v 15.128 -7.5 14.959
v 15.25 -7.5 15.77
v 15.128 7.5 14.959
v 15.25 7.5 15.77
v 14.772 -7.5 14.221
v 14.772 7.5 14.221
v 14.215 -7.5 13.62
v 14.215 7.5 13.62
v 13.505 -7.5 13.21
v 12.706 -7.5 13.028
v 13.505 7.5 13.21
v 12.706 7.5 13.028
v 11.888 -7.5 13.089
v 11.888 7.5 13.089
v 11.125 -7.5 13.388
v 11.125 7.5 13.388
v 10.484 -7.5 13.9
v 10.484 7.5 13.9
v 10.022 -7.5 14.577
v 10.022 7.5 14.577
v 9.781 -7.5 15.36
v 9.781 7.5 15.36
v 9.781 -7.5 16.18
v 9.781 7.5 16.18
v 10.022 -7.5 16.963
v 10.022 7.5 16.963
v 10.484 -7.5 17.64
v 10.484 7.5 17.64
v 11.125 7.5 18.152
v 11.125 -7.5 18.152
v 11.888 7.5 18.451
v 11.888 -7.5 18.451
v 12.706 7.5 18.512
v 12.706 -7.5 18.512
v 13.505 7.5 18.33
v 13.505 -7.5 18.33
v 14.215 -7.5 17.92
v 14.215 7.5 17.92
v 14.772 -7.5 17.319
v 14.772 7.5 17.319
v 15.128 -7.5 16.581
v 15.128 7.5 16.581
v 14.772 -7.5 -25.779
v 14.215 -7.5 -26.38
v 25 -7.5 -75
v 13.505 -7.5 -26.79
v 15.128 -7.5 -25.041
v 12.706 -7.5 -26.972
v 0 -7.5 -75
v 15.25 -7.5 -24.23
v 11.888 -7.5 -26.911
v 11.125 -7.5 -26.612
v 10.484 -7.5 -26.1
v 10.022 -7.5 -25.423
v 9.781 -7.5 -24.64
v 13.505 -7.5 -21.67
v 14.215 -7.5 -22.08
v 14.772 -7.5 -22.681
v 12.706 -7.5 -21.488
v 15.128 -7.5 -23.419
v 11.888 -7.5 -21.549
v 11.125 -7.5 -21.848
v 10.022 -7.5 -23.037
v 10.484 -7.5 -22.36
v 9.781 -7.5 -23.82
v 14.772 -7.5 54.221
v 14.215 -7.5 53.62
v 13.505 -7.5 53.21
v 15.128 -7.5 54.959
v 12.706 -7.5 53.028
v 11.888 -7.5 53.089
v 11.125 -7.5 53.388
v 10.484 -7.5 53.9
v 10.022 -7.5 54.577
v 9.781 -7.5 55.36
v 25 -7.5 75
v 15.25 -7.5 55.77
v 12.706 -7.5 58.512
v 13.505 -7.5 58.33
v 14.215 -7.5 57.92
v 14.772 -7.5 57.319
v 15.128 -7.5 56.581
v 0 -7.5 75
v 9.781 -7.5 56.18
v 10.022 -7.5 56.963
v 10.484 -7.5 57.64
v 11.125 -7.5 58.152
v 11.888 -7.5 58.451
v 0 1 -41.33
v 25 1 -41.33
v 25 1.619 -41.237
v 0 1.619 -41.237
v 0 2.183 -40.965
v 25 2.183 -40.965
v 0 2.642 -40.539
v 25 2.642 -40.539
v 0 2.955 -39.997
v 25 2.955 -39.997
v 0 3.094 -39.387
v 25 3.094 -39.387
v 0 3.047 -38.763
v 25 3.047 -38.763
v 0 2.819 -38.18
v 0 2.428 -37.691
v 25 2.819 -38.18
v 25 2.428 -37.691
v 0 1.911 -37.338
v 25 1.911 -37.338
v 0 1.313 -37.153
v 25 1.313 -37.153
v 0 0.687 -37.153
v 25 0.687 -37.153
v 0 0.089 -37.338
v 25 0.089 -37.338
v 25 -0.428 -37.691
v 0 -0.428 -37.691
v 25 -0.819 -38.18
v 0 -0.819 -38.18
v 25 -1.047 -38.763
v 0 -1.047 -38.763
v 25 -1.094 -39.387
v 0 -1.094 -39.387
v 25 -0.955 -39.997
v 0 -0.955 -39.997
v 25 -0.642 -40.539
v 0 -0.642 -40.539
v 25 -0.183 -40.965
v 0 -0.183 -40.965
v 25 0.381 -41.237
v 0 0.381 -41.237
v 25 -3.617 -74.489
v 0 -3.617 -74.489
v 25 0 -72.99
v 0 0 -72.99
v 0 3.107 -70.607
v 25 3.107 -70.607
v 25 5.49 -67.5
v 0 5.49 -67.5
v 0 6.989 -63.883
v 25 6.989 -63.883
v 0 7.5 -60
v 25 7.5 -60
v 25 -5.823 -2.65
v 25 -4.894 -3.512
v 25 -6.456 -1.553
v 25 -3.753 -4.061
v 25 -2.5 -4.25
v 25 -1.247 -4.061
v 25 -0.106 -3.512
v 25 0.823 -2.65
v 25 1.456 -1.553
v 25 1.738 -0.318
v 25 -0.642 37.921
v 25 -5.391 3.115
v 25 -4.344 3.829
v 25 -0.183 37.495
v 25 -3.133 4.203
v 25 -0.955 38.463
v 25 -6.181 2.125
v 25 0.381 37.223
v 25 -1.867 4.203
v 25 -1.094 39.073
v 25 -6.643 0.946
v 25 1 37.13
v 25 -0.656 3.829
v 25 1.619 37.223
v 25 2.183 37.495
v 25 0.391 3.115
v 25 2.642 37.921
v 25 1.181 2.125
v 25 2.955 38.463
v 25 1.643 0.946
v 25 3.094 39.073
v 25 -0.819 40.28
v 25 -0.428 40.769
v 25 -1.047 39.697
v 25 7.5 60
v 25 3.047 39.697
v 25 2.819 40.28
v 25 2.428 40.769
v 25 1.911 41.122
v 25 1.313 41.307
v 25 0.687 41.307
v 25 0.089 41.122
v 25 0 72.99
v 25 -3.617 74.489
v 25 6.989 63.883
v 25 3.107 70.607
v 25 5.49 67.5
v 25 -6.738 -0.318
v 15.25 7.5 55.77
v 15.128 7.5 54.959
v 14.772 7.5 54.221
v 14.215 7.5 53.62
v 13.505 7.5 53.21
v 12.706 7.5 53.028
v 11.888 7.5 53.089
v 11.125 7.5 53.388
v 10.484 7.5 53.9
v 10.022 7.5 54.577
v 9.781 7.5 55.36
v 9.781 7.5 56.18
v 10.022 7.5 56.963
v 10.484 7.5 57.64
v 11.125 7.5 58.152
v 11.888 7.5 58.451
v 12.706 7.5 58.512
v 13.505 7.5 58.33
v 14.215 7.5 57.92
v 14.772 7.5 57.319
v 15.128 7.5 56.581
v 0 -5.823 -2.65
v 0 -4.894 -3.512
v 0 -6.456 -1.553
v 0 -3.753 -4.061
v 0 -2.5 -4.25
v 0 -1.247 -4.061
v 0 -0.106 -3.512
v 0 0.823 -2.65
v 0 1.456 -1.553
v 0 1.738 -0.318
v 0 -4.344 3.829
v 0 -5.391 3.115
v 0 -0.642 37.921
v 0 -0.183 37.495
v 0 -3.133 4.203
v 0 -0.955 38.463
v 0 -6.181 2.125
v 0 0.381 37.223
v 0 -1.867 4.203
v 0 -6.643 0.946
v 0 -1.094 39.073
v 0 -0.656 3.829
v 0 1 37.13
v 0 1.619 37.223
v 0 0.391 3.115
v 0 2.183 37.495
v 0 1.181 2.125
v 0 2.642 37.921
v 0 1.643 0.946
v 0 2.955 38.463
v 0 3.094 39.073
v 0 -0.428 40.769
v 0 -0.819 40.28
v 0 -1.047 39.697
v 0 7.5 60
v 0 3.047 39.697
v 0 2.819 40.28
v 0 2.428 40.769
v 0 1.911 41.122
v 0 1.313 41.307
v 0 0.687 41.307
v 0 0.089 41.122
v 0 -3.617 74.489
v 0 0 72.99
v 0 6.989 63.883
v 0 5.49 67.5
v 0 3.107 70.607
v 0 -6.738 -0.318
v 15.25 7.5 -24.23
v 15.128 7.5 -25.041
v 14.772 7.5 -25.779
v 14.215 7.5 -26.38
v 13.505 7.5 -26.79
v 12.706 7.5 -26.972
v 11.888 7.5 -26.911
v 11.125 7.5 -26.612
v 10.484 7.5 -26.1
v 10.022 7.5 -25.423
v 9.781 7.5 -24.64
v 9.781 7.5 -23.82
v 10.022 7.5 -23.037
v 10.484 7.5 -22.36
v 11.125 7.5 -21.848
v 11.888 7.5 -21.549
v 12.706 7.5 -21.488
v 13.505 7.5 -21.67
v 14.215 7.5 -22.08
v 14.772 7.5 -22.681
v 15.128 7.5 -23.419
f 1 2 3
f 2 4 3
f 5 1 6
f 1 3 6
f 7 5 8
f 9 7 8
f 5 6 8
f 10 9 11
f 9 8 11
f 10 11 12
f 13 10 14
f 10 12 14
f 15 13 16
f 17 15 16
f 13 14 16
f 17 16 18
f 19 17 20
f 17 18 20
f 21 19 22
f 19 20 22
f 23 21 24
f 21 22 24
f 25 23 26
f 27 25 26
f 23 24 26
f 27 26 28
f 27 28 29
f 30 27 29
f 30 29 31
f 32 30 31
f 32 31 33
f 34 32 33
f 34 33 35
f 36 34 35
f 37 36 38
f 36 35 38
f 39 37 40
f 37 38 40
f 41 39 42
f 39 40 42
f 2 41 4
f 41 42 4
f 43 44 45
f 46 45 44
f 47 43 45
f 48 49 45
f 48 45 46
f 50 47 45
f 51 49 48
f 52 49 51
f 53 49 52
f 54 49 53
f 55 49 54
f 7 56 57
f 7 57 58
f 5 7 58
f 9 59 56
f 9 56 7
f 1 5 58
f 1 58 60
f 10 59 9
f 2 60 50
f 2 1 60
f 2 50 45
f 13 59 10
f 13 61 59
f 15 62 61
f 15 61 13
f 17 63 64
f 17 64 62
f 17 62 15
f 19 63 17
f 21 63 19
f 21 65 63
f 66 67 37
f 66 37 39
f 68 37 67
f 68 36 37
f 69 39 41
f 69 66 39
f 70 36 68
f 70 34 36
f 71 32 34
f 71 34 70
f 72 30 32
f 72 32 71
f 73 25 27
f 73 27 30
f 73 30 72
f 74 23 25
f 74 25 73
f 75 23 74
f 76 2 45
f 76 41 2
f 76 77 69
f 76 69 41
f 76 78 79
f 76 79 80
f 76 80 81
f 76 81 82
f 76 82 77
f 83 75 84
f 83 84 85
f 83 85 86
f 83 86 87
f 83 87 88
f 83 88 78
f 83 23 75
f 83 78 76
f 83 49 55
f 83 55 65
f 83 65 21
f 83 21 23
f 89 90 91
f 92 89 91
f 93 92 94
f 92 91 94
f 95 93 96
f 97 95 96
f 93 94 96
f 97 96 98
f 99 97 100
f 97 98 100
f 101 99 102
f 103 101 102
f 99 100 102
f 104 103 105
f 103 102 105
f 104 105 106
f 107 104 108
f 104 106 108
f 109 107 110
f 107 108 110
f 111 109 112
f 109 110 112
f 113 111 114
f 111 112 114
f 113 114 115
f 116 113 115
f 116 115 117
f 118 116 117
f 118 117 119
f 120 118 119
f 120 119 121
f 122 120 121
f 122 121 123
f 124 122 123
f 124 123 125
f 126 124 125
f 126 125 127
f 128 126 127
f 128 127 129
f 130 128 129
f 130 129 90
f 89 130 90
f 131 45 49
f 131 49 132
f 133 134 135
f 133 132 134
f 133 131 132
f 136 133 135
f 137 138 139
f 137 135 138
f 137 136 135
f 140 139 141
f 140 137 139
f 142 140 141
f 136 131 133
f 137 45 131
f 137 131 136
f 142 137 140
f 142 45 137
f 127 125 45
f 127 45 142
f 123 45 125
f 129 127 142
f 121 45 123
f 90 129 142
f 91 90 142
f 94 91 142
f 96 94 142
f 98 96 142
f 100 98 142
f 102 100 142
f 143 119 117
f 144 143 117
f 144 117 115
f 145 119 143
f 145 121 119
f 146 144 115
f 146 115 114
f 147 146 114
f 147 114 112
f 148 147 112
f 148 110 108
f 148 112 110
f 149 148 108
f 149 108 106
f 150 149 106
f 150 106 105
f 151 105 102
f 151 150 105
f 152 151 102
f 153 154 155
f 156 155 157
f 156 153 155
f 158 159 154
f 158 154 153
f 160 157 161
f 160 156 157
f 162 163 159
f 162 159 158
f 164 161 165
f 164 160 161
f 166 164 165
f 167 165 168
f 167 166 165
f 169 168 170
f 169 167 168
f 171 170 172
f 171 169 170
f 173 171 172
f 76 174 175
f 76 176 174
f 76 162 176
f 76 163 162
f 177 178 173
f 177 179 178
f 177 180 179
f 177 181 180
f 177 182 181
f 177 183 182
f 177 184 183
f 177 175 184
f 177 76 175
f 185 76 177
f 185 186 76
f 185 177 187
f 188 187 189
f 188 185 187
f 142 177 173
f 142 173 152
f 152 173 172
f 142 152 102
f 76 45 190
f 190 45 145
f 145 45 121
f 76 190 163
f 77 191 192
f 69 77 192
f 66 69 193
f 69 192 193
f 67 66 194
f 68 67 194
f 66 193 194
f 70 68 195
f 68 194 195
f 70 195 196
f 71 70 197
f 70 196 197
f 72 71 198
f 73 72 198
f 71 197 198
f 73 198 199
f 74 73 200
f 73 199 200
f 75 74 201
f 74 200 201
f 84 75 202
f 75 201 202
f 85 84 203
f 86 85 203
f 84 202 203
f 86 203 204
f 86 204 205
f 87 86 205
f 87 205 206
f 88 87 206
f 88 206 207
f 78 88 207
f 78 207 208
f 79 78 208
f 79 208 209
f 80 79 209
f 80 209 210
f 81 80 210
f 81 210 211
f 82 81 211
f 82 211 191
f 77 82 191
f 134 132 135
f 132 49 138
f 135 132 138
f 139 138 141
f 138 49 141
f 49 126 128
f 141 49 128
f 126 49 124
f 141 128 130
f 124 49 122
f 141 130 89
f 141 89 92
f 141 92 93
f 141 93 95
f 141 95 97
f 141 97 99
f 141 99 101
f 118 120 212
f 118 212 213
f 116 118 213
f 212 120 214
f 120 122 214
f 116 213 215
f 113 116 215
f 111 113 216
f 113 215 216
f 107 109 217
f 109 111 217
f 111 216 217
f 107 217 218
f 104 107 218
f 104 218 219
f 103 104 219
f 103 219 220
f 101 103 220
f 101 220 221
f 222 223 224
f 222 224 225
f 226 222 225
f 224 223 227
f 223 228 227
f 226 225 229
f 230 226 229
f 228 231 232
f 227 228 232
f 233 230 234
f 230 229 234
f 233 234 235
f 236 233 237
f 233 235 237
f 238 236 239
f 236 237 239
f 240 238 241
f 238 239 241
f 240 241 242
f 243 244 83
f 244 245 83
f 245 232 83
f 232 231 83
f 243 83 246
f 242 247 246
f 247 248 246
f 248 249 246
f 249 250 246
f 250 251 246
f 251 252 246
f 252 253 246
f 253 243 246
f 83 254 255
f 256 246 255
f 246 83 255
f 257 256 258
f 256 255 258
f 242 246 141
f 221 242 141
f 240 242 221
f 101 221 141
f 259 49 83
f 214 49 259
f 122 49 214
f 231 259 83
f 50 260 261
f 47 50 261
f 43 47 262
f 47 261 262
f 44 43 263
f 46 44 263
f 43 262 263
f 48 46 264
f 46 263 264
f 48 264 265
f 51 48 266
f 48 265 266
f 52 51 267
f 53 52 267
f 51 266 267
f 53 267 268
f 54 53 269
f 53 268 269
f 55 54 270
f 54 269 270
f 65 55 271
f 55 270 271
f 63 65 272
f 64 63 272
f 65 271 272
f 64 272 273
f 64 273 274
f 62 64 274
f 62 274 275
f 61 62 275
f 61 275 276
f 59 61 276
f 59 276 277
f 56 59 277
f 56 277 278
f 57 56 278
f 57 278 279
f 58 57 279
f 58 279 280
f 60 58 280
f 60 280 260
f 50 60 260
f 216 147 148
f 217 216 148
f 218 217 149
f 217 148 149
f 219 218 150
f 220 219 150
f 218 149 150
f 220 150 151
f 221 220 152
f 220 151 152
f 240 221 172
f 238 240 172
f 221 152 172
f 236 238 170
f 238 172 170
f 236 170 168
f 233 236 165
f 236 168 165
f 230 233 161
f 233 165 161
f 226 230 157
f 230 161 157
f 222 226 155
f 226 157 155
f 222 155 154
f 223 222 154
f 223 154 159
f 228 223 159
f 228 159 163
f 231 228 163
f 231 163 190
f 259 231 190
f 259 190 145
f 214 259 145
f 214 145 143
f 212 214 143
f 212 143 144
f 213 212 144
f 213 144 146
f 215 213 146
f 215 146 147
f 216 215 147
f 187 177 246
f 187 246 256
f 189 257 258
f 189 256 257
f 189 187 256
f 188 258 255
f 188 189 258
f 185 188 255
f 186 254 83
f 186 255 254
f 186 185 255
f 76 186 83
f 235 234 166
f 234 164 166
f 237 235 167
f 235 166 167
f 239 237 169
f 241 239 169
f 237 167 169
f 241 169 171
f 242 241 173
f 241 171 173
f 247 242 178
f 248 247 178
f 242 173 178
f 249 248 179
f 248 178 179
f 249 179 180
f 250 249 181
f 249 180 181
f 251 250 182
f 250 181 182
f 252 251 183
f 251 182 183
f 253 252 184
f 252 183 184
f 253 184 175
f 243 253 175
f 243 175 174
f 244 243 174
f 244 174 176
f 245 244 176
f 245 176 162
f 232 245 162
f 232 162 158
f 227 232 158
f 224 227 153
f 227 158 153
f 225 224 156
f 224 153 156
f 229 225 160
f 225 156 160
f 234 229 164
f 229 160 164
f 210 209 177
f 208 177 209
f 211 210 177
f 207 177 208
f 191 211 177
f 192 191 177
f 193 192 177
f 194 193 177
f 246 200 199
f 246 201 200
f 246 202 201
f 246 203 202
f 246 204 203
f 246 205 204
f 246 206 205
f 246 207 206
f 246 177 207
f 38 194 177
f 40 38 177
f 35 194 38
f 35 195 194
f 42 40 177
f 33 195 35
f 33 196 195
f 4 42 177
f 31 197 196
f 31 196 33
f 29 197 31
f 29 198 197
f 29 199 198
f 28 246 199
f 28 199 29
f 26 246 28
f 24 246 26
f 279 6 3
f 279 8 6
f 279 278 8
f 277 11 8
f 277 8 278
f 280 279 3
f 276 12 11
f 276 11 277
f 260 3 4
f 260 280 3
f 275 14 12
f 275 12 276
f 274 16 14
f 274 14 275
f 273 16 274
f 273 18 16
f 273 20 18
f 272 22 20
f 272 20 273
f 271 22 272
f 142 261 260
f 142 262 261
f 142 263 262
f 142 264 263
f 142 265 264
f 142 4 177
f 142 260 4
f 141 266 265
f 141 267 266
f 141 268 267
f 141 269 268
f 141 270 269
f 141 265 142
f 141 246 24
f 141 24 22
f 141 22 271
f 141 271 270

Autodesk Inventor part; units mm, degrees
ref_plane "YZ Plane" through (0, 0, 0) normal (1, 0, 0) x (0, 1, 0)
ref_plane "XZ Plane" through (0, 0, 0) normal (0, 1, 0) x (-1, 0, 0)
ref_plane "XY Plane" through (0, 0, 0) normal (0, 0, 1) x (1, 0, 0)
sketch "Sketch1" plane through (0, 0, 0) normal (1, 0, 0) x (0, 1, 0)
  line L0 (-7.5, 75) -> (7.5, 75)
  line L1 (7.5, 75) -> (7.5, -75)
  line L2 (7.5, -75) -> (-7.5, -75)
  line L3 (-7.5, -75) -> (-7.5, 75)
  line L4 (-7.5, 75) -> (7.5, -75) construction
  line L5 (7.5, 75) -> (-7.5, -75) construction
  point P0 (0, 0)
  dimension "d0" = 15
  dimension "d1" = 150
extrude "Extrusion1" add sketch "Sketch1" along normal blind 25
sketch "Sketch2" plane through (25, 0, 0) normal (1, 0, 0) x (0, 0, -1)
  circle A0 centre (-39.23, 1) radius 2.1
  circle A1 centre (39.23, 1) radius 2.1
  line L0 (-75, -7.5) -> (75, -7.5) projected
  line L1 (-75, 7.5) -> (-75, -7.5) projected
  line L2 (75, -7.5) -> (75, 7.5) projected
  point P0 (0, 0)
  dimension "d4" = 4.2
  dimension "d5" = 4.2
  dimension "d6" = 8.5
  dimension "d7" = 78.46
  dimension "d8" = 35.77
  dimension "d9" = 8.5
  dimension "d10" = 35.77
extrude "Extrusion2" cut sketch "Sketch2" against normal blind 25
fillet "Fillet1" radius 15 2 edges at (12.5, 7.5, 75) (12.5, 7.5, -75)
sketch "Sketch3" plane through (25, 0, 0) normal (1, 0, 0) x (0, 0, -1)
  circle A0 centre (0, -2.5) radius 4.25
  line L0 (60, 7.5) -> (-60, 7.5) projected
  arc A1 (75, -7.5) -> (60, 7.5) centre (60, -7.5) ccw projected
  point P0 (0, 0)
  dimension "d14" = 8.5
  dimension "d15" = 10
  dimension "d16" = 60
extrude "Extrusion3" cut sketch "Sketch3" against normal blind 25
sketch "Sketch4" plane through (0, 7.5, 60) normal (0, 1, 0) x (1, 0, 0)
  circle A0 centre (12.5, 4.23) radius 2.75 projected
  circle A1 centre (12.5, 44.23) radius 2.75 projected
  circle A2 centre (12.5, 84.23) radius 2.75 projected
  point P0 (0, 60)
extrude "Extrusion4" cut sketch "Sketch4" against normal blind 25
properties part number "Plastic Holders" material "PC/ABS Plastic"
